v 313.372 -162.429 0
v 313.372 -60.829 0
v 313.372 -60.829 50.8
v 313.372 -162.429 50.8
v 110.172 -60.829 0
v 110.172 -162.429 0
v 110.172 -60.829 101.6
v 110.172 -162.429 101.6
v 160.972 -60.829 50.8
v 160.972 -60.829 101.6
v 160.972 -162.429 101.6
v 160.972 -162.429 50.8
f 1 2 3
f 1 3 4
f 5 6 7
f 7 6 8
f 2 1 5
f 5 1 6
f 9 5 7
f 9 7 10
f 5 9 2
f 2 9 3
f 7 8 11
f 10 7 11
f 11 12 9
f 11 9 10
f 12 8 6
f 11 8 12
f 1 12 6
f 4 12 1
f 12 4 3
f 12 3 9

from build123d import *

# Parameters (mm, degrees)
F0_W     = 203.2
F0_H     = 101.6
F1_DEPTH = 50.8
F2_W     = 50.8
F2_H     = 50.8
F3_DEPTH = 101.6
F4_ANGLE = 180


with BuildPart() as f1:
    # F0 (on Top) → F1 (new body)
    with BuildSketch(Plane.XY):
        with Locations((8.5724983364, -10.0287537194)):
            Rectangle(F0_W, F0_H)
    extrude(amount=F1_DEPTH)

    # F2 (on face) → F3 (join)
    with BuildSketch(Plane(origin=(0, 40.7712462806, 0), x_dir=(-1, 0, 0), z_dir=(0, 1, 0))):
        with Locations((-84.7724983364, 76.2)):
            Rectangle(F2_W, F2_H)
    extrude(amount=-F3_DEPTH)


with BuildPart() as f1_1:
    # F4: moved
    add(f1.part.rotate(Axis((110.1724983364, -60.8287537194, 25.4), (0, 0, -1)), F4_ANGLE))


solid = f1_1.part
